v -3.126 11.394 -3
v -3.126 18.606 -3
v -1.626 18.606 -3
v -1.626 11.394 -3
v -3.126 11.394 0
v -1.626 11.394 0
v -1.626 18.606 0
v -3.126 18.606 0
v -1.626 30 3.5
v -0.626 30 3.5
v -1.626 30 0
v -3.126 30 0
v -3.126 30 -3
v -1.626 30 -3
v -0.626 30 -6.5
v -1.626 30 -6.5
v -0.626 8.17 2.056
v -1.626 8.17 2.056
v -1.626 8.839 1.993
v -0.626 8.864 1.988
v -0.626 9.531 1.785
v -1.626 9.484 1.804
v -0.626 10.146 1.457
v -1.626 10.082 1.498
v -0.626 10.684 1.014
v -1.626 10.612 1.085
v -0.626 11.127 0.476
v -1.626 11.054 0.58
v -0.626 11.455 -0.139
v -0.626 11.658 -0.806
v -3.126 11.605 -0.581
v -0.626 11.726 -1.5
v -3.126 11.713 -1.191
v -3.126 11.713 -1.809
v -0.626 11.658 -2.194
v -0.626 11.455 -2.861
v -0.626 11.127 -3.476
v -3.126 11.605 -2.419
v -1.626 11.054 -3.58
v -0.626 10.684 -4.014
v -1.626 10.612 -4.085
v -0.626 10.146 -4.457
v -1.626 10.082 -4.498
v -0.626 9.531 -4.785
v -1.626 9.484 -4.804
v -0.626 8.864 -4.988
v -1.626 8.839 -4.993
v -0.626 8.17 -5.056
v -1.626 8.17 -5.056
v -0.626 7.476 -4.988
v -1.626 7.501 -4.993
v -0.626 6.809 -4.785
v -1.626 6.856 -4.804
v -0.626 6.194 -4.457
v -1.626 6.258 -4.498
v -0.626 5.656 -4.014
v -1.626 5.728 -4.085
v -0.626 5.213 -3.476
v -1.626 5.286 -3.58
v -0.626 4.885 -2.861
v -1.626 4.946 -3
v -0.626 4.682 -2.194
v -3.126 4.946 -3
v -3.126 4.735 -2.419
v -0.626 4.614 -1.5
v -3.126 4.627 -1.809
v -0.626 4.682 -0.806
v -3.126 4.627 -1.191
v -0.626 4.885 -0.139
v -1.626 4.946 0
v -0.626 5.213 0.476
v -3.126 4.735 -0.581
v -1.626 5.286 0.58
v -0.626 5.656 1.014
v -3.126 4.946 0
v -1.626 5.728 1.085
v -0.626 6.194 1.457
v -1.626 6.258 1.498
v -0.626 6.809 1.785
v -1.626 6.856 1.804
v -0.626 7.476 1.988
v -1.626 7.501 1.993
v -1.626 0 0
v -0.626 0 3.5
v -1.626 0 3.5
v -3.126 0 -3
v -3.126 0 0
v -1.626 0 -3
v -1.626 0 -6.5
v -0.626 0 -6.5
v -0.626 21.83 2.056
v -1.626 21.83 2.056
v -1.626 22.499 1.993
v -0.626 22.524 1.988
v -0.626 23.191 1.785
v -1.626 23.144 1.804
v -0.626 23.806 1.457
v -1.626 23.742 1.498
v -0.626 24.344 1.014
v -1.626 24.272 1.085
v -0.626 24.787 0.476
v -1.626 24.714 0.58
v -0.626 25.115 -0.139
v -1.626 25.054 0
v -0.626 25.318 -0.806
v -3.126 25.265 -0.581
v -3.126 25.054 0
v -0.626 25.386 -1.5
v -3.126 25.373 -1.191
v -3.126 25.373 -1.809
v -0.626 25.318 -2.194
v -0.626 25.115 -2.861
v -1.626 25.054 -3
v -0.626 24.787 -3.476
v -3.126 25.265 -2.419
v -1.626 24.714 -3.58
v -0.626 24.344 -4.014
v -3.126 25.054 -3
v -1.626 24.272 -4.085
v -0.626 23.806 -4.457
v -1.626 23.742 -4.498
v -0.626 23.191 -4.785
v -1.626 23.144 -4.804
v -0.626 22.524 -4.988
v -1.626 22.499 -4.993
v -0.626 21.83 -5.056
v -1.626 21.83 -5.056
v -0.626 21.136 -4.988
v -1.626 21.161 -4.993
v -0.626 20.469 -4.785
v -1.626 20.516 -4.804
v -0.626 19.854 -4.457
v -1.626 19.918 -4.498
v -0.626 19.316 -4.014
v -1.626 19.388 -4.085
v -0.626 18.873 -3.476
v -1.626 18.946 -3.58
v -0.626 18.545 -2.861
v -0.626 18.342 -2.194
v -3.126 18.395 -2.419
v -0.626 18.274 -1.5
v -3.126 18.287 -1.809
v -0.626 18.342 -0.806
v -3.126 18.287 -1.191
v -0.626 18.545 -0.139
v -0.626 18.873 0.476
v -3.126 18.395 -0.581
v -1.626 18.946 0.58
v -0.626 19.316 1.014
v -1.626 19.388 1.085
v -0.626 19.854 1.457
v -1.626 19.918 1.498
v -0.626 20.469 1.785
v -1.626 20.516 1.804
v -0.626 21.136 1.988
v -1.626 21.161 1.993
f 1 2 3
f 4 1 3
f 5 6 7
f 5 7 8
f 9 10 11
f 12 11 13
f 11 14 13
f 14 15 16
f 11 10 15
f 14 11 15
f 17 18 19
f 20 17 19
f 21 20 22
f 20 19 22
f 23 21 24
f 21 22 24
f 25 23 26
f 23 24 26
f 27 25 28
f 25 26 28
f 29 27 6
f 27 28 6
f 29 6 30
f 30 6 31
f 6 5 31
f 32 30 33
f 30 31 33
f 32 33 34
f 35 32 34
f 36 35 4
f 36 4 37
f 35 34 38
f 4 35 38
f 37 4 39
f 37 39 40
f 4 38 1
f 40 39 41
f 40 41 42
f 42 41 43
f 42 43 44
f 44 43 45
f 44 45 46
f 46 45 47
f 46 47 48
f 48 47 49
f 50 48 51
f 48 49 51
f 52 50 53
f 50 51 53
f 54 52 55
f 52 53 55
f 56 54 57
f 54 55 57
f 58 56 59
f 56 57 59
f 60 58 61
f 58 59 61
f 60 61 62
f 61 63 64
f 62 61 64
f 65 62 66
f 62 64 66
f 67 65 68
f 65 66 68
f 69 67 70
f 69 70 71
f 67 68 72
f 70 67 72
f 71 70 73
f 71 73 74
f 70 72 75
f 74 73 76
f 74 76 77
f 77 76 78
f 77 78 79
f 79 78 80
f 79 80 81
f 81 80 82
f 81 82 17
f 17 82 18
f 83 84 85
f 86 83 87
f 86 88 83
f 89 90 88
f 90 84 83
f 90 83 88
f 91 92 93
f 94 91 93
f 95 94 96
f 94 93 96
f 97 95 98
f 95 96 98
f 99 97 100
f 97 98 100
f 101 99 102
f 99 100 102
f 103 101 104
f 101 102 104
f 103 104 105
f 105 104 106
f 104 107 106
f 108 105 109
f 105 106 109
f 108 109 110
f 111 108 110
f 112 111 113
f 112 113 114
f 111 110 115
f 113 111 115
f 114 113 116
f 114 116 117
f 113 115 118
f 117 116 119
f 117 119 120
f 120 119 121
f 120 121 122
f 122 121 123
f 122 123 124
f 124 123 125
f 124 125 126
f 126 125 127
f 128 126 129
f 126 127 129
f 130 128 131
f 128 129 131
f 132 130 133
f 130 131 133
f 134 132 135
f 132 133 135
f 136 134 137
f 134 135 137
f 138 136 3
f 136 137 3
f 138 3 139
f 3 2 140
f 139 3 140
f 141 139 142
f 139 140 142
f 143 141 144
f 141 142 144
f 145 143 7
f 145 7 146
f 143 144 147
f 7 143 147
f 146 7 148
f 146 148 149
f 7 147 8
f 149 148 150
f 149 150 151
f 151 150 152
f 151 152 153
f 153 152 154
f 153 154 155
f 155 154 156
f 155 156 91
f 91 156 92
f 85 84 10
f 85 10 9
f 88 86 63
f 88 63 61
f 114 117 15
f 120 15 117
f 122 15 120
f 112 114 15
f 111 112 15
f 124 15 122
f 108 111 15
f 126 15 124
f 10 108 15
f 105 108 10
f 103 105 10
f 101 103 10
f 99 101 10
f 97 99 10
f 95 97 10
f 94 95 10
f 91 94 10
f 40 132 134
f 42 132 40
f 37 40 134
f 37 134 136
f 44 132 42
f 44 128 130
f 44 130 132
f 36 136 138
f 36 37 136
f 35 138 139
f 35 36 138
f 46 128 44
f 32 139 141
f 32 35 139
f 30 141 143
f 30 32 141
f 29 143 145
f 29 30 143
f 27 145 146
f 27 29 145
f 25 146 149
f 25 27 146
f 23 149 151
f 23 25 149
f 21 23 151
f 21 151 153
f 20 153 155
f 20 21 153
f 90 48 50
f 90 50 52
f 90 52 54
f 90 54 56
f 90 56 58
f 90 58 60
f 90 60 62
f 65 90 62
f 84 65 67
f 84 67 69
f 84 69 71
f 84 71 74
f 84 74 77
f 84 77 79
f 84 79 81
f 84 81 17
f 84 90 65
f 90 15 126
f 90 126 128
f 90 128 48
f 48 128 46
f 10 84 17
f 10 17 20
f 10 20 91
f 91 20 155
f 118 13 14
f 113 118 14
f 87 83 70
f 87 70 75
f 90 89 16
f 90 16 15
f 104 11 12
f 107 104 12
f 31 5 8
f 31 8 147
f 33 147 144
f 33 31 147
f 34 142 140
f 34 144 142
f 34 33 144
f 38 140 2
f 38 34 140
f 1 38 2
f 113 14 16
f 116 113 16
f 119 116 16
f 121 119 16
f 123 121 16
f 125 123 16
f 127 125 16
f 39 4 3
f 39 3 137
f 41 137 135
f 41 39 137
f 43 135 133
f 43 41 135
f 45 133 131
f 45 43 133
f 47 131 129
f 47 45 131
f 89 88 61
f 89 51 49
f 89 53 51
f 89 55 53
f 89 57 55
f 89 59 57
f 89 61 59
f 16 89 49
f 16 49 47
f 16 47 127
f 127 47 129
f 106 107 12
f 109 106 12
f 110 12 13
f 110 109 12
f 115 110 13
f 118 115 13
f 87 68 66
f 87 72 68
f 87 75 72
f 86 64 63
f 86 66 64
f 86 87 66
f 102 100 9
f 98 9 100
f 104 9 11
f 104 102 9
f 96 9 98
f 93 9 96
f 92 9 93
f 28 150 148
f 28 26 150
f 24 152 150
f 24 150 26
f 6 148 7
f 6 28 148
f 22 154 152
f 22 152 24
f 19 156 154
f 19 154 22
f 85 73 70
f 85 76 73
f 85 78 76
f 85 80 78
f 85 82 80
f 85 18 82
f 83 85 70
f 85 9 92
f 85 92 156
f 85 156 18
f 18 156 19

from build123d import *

# Parameters (mm, degrees)
BOSS_EXTRUDE1_DEPTH = 30
SKETCH2_R           = 3.556
CUT_EXTRUDE1_DEPTH  = 30


with BuildPart() as part:
    # Sketch1 → Boss-Extrude1 (new body)
    with BuildSketch(Plane(origin=(0, 0, 0), x_dir=(1, 0, 0), z_dir=(0, 1, 0))):
        Polygon((-1.62605042, 3), (-1.62605042, 6.5), (-0.62605042, 6.5), (-0.62605042, -3.5), (-1.62605042, -3.5), (-1.62605042, 0), (-3.12605042, 0), (-3.12605042, 3), align=None)
    extrude(amount=BOSS_EXTRUDE1_DEPTH)

    # Sketch2 → Cut-Extrude1 (cut)
    with BuildSketch(Plane.ZY.offset(3.12605042)):
        with Locations((-1.5, 21.829992104)):
            Circle(SKETCH2_R)
        with Locations((-1.5, 8.170007896)):
            Circle(SKETCH2_R)
    extrude(amount=-CUT_EXTRUDE1_DEPTH, mode=Mode.SUBTRACT)


solid = part.part
